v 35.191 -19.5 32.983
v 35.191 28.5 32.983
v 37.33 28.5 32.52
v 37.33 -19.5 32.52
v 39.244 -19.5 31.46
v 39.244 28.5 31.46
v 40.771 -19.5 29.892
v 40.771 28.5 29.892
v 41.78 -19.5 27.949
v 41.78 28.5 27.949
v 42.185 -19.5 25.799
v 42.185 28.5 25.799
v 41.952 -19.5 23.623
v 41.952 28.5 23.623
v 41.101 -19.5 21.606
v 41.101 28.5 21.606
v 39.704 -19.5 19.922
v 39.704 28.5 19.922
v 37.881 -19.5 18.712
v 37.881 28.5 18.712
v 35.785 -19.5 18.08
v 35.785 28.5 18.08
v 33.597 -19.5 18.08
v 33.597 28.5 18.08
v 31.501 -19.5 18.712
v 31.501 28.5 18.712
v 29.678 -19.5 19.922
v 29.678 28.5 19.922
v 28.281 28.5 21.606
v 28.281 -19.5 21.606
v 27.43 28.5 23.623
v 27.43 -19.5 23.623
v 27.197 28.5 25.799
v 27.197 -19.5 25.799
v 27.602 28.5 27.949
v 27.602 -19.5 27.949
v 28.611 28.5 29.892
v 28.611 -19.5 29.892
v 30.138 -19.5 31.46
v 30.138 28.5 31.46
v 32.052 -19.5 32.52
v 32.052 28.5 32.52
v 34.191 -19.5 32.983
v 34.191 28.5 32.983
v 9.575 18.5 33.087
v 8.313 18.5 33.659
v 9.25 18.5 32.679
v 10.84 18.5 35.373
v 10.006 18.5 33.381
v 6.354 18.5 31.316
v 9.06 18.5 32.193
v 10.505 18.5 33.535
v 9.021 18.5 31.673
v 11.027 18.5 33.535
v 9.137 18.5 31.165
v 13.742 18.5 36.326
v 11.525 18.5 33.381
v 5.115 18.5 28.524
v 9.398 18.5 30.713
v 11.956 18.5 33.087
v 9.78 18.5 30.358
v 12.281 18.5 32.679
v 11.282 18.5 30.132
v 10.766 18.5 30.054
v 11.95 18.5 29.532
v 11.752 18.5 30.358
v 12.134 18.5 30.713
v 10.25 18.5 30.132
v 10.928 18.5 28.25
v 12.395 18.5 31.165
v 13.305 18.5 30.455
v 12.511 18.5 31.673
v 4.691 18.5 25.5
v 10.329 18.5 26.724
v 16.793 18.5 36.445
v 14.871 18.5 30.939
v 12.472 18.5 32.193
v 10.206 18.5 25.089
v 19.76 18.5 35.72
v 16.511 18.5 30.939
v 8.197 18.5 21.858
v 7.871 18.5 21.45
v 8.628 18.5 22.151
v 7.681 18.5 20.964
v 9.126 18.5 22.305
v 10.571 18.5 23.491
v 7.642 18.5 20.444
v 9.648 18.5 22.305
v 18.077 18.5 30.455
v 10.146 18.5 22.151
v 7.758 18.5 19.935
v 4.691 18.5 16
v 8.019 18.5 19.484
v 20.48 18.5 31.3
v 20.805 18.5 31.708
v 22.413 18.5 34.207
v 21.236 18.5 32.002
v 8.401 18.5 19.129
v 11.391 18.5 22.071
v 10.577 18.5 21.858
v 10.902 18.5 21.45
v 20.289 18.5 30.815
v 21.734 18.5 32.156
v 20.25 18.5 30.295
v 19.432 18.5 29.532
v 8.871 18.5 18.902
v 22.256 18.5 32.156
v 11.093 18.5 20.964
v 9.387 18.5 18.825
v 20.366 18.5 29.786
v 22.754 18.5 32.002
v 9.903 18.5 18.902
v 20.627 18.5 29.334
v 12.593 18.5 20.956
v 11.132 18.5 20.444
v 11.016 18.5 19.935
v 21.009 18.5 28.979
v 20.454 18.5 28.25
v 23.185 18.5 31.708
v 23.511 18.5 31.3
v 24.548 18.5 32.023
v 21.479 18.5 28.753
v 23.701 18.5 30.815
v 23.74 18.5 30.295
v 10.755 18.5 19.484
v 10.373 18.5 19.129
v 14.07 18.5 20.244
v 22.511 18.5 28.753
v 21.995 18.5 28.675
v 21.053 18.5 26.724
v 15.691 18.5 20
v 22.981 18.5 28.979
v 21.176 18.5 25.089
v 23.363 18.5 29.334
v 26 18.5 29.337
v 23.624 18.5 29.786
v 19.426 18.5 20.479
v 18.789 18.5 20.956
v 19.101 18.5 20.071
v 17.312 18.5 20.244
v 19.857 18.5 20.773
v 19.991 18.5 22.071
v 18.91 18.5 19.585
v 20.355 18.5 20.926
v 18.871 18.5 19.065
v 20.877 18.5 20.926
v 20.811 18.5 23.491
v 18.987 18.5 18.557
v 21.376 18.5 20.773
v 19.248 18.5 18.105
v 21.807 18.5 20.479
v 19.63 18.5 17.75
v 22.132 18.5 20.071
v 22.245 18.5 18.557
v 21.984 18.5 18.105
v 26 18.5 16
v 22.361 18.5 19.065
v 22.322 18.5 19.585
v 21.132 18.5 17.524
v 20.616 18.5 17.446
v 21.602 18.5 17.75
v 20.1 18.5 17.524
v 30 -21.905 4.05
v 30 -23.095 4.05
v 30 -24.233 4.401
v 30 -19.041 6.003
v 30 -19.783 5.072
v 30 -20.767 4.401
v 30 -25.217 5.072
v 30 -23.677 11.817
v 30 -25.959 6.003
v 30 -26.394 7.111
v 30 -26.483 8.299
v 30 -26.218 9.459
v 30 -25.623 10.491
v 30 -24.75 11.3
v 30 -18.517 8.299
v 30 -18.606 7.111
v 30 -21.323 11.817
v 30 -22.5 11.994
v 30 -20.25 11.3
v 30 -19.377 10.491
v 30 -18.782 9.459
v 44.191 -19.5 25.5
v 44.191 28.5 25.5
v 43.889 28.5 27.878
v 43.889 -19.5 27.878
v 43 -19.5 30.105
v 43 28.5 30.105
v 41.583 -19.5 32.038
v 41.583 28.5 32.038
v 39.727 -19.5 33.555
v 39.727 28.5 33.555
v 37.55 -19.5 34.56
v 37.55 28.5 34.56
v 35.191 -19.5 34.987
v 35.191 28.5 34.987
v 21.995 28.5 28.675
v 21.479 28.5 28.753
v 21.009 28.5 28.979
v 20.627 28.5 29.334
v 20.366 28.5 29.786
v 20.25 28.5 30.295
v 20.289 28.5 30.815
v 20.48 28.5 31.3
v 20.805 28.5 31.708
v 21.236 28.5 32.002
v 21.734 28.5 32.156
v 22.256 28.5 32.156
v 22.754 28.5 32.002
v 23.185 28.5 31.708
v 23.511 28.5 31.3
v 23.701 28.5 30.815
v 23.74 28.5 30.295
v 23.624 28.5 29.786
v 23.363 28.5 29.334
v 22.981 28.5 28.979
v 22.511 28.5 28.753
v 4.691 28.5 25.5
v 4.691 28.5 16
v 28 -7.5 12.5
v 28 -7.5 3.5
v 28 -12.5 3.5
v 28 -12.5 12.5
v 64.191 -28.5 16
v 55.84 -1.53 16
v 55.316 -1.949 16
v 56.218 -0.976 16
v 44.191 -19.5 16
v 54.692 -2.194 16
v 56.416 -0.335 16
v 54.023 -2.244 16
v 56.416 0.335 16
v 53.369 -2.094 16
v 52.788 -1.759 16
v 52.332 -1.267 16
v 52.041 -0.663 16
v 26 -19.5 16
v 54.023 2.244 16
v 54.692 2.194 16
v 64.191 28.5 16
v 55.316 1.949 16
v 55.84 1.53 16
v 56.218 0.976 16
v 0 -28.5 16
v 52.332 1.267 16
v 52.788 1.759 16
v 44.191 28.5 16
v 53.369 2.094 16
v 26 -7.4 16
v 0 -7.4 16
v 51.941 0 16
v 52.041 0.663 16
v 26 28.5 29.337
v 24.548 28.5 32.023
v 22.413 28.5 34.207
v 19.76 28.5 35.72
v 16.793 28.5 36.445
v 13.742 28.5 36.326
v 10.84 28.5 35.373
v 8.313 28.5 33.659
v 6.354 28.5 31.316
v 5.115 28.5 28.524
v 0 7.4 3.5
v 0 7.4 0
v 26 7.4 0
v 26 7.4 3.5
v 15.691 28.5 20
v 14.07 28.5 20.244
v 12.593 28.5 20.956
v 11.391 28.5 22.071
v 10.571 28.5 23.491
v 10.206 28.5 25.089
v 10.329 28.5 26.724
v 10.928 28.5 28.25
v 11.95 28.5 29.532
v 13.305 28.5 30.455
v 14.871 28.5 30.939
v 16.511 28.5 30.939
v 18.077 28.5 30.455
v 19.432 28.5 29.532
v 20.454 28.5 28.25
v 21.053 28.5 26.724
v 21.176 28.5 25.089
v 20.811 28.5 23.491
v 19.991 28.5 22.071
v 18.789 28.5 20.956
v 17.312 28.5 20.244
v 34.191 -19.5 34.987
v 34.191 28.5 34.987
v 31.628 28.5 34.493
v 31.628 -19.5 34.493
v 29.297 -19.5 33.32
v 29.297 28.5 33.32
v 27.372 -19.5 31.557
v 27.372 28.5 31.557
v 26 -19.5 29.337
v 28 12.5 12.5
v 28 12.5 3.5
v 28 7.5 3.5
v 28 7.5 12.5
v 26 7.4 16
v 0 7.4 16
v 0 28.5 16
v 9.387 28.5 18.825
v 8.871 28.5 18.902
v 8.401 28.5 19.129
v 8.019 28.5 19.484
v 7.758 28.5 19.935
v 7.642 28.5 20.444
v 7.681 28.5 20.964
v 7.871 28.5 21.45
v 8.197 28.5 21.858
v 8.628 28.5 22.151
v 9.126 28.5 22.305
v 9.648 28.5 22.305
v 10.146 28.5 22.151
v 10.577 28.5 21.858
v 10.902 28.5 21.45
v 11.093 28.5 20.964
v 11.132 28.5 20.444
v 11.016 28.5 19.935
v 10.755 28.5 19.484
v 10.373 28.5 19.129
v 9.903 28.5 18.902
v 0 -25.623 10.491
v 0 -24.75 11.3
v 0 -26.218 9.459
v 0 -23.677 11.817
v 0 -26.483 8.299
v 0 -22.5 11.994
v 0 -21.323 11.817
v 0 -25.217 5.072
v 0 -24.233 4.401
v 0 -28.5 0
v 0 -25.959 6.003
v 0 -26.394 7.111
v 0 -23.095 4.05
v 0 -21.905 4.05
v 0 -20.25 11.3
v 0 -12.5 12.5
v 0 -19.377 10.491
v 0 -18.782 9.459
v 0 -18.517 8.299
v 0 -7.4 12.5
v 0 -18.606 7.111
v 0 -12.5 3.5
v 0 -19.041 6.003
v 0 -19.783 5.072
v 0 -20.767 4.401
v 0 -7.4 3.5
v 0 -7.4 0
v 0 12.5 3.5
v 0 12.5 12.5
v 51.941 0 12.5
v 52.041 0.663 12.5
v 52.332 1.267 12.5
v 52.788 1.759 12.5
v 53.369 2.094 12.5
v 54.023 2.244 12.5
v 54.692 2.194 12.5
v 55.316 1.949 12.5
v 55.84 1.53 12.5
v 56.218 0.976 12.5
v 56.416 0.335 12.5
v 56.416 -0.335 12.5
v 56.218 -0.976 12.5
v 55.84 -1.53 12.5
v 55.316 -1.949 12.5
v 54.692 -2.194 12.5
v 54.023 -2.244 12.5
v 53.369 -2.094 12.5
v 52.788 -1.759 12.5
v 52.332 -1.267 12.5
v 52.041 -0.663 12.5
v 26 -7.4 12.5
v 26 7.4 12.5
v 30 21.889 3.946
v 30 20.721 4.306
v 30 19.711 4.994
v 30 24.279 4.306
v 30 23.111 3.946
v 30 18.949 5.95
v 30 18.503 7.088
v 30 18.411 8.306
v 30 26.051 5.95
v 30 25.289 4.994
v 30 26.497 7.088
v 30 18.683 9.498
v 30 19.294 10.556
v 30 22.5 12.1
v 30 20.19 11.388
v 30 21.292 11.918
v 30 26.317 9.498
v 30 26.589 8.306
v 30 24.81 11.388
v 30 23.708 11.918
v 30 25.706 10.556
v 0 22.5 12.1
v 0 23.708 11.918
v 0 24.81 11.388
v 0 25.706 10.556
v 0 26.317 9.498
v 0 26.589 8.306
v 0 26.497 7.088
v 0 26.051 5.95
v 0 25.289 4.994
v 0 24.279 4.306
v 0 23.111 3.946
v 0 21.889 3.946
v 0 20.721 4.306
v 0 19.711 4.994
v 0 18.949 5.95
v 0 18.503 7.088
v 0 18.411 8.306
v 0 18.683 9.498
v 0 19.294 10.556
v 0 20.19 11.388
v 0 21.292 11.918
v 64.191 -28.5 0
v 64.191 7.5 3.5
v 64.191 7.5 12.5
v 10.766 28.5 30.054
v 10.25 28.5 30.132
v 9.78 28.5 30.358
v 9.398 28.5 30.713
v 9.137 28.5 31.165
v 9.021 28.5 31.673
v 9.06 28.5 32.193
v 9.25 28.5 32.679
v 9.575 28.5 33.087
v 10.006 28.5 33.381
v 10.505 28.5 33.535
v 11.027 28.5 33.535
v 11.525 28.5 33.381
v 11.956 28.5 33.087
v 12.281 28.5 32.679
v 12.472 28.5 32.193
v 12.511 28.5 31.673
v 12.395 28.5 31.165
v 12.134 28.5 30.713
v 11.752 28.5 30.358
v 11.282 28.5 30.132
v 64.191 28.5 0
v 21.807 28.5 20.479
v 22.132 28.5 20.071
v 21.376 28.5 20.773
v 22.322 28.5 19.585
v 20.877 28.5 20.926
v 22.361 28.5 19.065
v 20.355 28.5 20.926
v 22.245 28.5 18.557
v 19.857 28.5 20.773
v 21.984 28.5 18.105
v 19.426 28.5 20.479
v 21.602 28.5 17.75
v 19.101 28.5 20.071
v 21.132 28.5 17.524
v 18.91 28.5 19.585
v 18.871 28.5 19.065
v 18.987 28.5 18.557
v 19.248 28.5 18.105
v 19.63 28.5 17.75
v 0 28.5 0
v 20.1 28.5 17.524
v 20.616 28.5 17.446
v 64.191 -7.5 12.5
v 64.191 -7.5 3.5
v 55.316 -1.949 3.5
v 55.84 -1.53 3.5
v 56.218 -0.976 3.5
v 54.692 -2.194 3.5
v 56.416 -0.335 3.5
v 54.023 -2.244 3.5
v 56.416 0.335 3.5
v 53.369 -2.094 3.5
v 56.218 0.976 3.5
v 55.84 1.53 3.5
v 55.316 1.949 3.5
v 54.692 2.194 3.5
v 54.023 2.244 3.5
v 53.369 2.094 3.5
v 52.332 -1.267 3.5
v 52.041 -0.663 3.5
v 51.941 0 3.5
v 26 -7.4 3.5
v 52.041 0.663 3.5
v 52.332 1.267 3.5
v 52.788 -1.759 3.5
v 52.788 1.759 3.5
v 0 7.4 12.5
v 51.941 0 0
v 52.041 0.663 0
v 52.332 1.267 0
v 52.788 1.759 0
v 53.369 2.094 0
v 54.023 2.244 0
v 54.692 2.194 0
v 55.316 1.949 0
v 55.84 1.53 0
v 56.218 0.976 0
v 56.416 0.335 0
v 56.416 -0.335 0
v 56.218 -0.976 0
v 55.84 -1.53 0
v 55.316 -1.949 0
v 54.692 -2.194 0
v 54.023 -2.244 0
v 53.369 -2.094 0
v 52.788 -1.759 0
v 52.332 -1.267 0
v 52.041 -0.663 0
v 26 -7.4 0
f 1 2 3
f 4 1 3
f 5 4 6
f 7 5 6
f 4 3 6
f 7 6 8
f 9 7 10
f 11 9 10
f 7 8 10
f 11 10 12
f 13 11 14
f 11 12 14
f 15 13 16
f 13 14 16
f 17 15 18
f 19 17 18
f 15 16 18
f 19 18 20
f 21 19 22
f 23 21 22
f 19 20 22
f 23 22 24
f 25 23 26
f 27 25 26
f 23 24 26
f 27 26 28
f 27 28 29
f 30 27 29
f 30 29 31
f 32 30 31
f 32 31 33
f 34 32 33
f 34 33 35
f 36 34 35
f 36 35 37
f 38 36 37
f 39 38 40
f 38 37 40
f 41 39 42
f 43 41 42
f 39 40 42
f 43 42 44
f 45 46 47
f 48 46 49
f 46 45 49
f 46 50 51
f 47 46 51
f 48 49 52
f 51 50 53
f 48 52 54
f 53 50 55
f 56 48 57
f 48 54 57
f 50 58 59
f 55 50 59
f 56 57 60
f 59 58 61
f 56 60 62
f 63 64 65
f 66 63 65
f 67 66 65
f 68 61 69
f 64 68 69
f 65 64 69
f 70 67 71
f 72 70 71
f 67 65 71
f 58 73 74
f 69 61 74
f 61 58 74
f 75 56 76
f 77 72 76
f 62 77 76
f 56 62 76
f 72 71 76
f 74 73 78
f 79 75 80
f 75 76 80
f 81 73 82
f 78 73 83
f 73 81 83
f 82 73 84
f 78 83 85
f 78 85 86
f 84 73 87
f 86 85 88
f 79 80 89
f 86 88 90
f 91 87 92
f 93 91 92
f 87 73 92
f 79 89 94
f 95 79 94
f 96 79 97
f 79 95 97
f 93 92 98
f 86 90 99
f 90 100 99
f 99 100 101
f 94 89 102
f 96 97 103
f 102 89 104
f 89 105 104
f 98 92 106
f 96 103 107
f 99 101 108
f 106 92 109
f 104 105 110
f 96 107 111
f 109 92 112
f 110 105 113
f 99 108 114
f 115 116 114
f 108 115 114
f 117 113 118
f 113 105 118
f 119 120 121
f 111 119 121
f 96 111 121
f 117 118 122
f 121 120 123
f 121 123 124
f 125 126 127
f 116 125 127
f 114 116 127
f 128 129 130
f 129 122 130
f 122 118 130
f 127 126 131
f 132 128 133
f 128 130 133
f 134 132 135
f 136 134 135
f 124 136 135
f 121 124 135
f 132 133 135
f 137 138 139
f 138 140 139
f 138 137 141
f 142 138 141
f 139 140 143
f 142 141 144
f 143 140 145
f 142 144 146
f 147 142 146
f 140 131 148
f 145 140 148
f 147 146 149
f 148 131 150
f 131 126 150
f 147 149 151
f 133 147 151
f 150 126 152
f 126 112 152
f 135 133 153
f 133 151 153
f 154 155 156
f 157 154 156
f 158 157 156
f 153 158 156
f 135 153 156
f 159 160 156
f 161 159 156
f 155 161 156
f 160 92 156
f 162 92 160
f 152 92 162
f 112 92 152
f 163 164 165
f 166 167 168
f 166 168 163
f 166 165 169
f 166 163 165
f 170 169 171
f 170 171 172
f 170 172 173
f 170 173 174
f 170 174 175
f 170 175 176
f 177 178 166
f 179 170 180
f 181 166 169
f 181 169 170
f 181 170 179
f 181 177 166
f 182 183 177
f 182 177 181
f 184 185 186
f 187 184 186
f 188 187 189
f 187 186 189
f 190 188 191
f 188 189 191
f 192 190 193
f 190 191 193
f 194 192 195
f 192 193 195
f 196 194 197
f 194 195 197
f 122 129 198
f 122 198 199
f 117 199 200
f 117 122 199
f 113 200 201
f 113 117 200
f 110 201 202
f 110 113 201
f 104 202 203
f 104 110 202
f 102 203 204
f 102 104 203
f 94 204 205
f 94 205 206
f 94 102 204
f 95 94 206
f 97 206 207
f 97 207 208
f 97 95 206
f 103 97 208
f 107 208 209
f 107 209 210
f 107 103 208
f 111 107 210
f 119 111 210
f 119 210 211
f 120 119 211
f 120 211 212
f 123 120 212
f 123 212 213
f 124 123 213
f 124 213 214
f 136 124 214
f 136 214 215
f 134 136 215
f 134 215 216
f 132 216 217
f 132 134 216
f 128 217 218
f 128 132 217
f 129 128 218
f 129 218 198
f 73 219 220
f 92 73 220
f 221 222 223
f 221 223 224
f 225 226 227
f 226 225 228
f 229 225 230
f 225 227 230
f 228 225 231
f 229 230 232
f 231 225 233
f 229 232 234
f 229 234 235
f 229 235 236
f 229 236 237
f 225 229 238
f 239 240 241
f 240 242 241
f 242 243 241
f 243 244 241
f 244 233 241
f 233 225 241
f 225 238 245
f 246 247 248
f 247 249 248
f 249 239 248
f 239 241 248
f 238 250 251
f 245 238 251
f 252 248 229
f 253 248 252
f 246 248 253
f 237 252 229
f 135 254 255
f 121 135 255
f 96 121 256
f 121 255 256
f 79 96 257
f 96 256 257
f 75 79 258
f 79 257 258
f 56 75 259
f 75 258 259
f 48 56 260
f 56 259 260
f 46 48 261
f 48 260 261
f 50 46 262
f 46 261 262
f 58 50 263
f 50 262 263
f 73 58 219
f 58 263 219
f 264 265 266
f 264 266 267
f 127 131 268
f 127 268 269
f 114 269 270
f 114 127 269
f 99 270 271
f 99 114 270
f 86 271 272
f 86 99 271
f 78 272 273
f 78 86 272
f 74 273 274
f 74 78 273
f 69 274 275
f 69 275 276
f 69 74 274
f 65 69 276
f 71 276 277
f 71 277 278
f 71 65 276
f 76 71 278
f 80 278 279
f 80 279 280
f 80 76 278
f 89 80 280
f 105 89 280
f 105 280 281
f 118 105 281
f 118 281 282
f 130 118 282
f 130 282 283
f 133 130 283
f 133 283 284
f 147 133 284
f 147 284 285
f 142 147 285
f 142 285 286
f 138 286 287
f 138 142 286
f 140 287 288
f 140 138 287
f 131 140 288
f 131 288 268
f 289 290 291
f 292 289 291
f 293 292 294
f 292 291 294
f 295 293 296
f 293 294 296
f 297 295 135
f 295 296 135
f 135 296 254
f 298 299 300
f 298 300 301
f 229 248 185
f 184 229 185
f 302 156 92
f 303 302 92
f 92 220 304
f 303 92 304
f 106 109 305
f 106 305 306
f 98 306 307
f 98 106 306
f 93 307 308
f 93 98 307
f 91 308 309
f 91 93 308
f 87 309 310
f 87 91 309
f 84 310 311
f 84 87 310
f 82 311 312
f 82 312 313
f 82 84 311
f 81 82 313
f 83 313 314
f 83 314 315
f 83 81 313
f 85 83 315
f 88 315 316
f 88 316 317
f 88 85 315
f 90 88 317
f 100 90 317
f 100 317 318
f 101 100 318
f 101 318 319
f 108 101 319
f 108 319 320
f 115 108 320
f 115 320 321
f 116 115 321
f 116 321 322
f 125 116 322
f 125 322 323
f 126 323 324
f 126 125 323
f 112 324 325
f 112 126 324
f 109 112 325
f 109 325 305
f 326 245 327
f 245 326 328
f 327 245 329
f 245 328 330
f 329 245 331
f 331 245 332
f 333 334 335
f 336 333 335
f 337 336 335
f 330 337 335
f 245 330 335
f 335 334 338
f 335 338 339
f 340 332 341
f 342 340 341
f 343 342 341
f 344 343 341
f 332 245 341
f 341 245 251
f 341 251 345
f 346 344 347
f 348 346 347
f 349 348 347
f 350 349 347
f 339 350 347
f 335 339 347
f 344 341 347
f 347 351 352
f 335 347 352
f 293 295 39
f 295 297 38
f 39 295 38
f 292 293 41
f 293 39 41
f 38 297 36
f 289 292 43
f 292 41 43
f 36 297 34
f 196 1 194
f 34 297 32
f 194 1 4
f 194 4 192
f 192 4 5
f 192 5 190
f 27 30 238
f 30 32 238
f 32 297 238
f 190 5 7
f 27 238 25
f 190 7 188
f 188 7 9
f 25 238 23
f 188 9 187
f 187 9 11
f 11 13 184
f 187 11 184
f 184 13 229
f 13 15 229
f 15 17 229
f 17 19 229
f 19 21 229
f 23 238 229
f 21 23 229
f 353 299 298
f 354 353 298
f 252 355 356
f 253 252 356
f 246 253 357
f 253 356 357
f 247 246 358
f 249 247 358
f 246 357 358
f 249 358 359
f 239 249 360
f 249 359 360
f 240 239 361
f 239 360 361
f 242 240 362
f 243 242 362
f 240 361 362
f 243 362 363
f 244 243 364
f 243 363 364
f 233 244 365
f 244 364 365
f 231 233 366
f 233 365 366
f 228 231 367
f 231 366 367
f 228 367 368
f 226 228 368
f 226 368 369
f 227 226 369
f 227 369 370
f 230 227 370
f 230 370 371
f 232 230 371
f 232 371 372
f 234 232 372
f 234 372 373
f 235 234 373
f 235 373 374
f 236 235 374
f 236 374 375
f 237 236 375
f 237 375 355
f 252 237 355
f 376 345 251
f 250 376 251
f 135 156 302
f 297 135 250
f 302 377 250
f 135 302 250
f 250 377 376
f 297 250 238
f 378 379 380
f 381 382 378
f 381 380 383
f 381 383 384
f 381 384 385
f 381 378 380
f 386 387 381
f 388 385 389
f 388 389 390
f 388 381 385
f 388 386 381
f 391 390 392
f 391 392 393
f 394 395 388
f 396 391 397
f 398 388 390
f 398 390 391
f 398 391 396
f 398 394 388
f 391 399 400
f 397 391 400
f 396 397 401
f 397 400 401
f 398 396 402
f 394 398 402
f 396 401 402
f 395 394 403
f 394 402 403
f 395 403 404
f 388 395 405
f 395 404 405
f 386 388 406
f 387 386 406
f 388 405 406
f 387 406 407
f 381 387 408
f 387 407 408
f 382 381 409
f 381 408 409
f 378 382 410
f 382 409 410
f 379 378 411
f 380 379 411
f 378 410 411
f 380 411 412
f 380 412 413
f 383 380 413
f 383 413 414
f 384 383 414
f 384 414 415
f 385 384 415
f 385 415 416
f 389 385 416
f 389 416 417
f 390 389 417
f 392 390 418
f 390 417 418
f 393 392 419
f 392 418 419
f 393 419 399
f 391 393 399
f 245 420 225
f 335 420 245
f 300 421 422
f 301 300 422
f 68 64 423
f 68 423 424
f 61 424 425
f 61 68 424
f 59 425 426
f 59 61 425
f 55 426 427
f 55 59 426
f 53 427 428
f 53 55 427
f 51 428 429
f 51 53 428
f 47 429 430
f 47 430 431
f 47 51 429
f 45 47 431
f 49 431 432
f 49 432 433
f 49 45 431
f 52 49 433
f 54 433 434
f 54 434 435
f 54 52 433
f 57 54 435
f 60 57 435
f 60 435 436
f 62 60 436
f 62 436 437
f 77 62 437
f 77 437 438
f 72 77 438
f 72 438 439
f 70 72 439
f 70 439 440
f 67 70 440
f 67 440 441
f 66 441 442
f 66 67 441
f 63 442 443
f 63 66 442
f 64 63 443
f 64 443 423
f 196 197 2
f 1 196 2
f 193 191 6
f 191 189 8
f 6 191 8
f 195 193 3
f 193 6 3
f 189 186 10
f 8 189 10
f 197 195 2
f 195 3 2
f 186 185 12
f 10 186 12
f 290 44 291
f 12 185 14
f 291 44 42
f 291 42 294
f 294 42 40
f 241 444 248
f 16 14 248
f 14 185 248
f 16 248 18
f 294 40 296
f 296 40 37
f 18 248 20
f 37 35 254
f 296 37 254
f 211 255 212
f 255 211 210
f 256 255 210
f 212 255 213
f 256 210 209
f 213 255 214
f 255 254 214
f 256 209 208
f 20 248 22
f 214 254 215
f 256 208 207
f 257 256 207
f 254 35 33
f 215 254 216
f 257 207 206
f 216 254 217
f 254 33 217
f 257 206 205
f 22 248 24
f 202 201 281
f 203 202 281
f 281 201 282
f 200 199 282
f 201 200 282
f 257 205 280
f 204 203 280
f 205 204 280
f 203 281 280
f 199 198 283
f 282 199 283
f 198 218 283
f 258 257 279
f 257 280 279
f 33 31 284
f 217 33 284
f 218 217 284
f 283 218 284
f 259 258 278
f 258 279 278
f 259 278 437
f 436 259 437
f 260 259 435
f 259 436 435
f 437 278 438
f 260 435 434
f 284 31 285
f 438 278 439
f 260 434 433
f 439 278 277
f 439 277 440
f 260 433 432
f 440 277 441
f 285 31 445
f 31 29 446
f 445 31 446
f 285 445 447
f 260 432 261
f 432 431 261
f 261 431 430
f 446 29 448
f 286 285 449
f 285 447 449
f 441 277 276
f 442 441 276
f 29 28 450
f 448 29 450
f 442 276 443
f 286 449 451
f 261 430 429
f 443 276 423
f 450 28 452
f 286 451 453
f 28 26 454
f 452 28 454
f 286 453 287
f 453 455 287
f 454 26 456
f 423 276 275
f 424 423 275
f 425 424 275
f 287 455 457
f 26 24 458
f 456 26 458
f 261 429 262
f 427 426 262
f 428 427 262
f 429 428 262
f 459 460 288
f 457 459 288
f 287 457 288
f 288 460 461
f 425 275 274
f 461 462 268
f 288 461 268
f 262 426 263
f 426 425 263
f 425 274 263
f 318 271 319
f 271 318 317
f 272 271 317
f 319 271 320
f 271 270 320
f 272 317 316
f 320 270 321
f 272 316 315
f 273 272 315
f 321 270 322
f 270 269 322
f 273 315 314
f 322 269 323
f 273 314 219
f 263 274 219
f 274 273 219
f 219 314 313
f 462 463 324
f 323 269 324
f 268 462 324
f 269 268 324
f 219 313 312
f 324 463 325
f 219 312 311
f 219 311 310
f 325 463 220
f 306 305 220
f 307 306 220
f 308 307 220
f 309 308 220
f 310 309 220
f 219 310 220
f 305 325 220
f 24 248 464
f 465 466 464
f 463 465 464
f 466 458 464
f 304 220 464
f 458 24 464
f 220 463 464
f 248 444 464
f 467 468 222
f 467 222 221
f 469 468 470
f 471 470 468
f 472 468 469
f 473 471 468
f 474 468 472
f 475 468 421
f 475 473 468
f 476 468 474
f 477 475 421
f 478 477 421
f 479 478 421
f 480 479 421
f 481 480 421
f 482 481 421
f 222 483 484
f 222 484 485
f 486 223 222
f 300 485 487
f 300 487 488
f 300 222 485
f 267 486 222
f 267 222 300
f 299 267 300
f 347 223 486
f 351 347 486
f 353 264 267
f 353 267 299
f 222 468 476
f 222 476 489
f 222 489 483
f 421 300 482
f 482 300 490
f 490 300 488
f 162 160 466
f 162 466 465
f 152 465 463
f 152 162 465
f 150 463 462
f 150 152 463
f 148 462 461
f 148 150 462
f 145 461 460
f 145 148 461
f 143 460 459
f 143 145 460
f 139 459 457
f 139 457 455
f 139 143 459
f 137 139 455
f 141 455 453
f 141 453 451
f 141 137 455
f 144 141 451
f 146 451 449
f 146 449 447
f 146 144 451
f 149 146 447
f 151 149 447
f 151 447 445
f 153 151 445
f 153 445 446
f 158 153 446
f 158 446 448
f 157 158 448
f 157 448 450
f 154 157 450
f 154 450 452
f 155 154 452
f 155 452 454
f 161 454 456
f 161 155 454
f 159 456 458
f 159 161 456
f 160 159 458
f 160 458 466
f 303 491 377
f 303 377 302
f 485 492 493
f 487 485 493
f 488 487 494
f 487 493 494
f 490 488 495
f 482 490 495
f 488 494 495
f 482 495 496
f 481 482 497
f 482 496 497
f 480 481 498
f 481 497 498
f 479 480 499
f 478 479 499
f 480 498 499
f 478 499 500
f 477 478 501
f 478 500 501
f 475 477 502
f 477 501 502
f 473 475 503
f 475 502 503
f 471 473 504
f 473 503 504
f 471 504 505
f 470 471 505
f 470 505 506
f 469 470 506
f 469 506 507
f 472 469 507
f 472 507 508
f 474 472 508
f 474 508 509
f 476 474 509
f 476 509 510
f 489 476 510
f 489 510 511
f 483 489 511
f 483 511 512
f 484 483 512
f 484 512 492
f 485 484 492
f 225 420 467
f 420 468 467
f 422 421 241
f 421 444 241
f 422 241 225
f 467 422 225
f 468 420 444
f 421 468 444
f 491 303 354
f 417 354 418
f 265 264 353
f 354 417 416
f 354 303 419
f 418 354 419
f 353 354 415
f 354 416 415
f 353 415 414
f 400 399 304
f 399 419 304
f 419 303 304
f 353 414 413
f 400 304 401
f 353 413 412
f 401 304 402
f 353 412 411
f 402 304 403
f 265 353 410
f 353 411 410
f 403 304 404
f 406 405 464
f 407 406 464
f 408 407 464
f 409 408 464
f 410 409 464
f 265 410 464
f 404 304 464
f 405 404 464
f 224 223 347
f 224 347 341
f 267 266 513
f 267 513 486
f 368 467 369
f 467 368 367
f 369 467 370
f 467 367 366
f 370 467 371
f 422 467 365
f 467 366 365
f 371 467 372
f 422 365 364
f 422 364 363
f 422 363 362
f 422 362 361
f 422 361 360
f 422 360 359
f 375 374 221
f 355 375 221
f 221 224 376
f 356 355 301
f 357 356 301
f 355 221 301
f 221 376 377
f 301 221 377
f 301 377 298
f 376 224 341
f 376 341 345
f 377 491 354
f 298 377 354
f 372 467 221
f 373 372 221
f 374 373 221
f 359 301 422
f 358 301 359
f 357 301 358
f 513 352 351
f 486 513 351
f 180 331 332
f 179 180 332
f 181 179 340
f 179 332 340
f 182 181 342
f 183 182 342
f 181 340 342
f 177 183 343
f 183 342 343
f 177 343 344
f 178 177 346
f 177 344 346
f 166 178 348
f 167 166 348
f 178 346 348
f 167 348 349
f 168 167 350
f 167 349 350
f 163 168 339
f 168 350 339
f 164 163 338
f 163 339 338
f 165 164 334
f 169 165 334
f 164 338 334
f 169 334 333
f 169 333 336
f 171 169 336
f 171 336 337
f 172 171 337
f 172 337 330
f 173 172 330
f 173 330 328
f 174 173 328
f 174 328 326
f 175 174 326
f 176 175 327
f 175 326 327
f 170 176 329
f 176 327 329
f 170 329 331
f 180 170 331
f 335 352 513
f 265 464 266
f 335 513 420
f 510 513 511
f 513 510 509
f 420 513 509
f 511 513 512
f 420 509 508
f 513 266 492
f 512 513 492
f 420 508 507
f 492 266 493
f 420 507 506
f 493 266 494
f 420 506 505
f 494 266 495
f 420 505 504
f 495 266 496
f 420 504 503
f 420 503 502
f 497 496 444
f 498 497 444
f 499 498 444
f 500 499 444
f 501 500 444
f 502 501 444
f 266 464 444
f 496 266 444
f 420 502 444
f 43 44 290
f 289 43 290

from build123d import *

# Parameters (mm, degrees)
SKETCH1_R            = 5.5
SKETCH1_R_2          = 1.75
BOSS_EXTRUDE1_DEPTH  = 28.5
CUT_EXTRUDE1_DEPTH   = 74.164092839
SKETCH3_W            = 9
SKETCH3_H            = 25
CUT_EXTRUDE2_DEPTH   = 28
SKETCH4_W            = 16
SKETCH4_H            = 14.8
CUT_EXTRUDE3_DEPTH   = 26.000210526
M4_CLEARANCE_HOLE1_D = 4.5
SKETCH6_R            = 3.994459126
SKETCH6_R_2          = 4.1
CUT_EXTRUDE4_DEPTH   = 30
SKETCH7_W            = 9
SKETCH7_H            = 15
CUT_EXTRUDE5_DEPTH   = 59.773195259


with BuildPart() as part:
    # Sketch1 → Boss-Extrude1 (new, symmetric)
    with BuildSketch(Plane(origin=(0, 0, 0), x_dir=(1, 0, 0), z_dir=(0, 1, 0))):
        with BuildLine():
            Line((0, 0), (64.191, 0))
            Line((64.191, 0), (64.191, -16))
            Line((64.191, -16), (44.191, -16))
            Line((44.191, -16), (44.191, -25.5))
            ThreePointArc((44.191, -25.5), (41.583024376, -32.038348415), (35.191, -34.986832981))
            Line((35.191, -34.986832981), (35.191, -32.983314774))
            ThreePointArc((35.191, -32.983314774), (34.691, -18), (34.191, -32.983314774))
            Line((34.191, -32.983314774), (34.191, -34.986832981))
            ThreePointArc((34.191, -34.986832981), (29.296680203, -33.319930558), (26.000210526, -29.336688458))
            ThreePointArc((26.000210526, -29.336688458), (13.741809885, -36.325925267), (4.691, -25.5))
            Line((4.691, -25.5), (4.691, -16))
            Line((4.691, -16), (0, -16))
            Line((0, -16), (0, 0))
        make_face()
        with Locations(Location((15.691, -25.5, 0), (0, 0, 90))):
            Circle(SKETCH1_R, mode=Mode.SUBTRACT)
        with Locations(Location((10.765708197, -31.804086029, 0), (0, 0, 90))):
            Circle(SKETCH1_R_2, mode=Mode.SUBTRACT)
        with Locations(Location((9.386913971, -20.574708197, 0), (0, 0, 90))):
            Circle(SKETCH1_R_2, mode=Mode.SUBTRACT)
        with Locations(Location((20.616291803, -19.195913971, 0), (0, 0, 90))):
            Circle(SKETCH1_R_2, mode=Mode.SUBTRACT)
        with Locations(Location((21.995086029, -30.425291803, 0), (0, 0, 90))):
            Circle(SKETCH1_R_2, mode=Mode.SUBTRACT)
    extrude(amount=BOSS_EXTRUDE1_DEPTH, both=True)

    # Sketch2 → Cut-Extrude1 (cut, through all)
    with BuildSketch(Plane.XY.offset(16)):
        Polygon((4.691, 18.5), (26.000210526, 18.5), (26.000210526, -19.5), (44.191, -19.5), (44.191, -28.5), (4.691, -28.5), align=None)
    extrude(amount=CUT_EXTRUDE1_DEPTH, mode=Mode.SUBTRACT)

    # Sketch3 → Cut-Extrude2 (cut)
    with BuildSketch(Plane.ZY):
        with Locations((8, 0)):
            Rectangle(SKETCH3_W, SKETCH3_H)
    extrude(amount=-CUT_EXTRUDE2_DEPTH, mode=Mode.SUBTRACT)

    # Sketch4 → Cut-Extrude3 (cut)
    with BuildSketch(Plane.ZY):
        with Locations((8, 0)):
            Rectangle(SKETCH4_W, SKETCH4_H)
    extrude(amount=-CUT_EXTRUDE3_DEPTH, mode=Mode.SUBTRACT)

    # M4 Clearance Hole1 (through all)
    with Locations(Plane(origin=(54.191, 0, 16), x_dir=(1, 0, 0), z_dir=(0, 0, 1))):
        with Locations((0, 0)):
            Hole(M4_CLEARANCE_HOLE1_D / 2)

    # Sketch6 → Cut-Extrude4 (cut)
    with BuildSketch(Plane.ZY):
        with Locations((8, -22.5)):
            Circle(SKETCH6_R)
        with Locations((8, 22.5)):
            Circle(SKETCH6_R_2)
    extrude(amount=-CUT_EXTRUDE4_DEPTH, mode=Mode.SUBTRACT)

    # Sketch7 → Cut-Extrude5 (cut, through all)
    with BuildSketch(Plane.ZY.offset(-28)):
        with Locations((8, 0)):
            Rectangle(SKETCH7_W, SKETCH7_H)
    extrude(amount=-CUT_EXTRUDE5_DEPTH, mode=Mode.SUBTRACT)


solid = part.part
